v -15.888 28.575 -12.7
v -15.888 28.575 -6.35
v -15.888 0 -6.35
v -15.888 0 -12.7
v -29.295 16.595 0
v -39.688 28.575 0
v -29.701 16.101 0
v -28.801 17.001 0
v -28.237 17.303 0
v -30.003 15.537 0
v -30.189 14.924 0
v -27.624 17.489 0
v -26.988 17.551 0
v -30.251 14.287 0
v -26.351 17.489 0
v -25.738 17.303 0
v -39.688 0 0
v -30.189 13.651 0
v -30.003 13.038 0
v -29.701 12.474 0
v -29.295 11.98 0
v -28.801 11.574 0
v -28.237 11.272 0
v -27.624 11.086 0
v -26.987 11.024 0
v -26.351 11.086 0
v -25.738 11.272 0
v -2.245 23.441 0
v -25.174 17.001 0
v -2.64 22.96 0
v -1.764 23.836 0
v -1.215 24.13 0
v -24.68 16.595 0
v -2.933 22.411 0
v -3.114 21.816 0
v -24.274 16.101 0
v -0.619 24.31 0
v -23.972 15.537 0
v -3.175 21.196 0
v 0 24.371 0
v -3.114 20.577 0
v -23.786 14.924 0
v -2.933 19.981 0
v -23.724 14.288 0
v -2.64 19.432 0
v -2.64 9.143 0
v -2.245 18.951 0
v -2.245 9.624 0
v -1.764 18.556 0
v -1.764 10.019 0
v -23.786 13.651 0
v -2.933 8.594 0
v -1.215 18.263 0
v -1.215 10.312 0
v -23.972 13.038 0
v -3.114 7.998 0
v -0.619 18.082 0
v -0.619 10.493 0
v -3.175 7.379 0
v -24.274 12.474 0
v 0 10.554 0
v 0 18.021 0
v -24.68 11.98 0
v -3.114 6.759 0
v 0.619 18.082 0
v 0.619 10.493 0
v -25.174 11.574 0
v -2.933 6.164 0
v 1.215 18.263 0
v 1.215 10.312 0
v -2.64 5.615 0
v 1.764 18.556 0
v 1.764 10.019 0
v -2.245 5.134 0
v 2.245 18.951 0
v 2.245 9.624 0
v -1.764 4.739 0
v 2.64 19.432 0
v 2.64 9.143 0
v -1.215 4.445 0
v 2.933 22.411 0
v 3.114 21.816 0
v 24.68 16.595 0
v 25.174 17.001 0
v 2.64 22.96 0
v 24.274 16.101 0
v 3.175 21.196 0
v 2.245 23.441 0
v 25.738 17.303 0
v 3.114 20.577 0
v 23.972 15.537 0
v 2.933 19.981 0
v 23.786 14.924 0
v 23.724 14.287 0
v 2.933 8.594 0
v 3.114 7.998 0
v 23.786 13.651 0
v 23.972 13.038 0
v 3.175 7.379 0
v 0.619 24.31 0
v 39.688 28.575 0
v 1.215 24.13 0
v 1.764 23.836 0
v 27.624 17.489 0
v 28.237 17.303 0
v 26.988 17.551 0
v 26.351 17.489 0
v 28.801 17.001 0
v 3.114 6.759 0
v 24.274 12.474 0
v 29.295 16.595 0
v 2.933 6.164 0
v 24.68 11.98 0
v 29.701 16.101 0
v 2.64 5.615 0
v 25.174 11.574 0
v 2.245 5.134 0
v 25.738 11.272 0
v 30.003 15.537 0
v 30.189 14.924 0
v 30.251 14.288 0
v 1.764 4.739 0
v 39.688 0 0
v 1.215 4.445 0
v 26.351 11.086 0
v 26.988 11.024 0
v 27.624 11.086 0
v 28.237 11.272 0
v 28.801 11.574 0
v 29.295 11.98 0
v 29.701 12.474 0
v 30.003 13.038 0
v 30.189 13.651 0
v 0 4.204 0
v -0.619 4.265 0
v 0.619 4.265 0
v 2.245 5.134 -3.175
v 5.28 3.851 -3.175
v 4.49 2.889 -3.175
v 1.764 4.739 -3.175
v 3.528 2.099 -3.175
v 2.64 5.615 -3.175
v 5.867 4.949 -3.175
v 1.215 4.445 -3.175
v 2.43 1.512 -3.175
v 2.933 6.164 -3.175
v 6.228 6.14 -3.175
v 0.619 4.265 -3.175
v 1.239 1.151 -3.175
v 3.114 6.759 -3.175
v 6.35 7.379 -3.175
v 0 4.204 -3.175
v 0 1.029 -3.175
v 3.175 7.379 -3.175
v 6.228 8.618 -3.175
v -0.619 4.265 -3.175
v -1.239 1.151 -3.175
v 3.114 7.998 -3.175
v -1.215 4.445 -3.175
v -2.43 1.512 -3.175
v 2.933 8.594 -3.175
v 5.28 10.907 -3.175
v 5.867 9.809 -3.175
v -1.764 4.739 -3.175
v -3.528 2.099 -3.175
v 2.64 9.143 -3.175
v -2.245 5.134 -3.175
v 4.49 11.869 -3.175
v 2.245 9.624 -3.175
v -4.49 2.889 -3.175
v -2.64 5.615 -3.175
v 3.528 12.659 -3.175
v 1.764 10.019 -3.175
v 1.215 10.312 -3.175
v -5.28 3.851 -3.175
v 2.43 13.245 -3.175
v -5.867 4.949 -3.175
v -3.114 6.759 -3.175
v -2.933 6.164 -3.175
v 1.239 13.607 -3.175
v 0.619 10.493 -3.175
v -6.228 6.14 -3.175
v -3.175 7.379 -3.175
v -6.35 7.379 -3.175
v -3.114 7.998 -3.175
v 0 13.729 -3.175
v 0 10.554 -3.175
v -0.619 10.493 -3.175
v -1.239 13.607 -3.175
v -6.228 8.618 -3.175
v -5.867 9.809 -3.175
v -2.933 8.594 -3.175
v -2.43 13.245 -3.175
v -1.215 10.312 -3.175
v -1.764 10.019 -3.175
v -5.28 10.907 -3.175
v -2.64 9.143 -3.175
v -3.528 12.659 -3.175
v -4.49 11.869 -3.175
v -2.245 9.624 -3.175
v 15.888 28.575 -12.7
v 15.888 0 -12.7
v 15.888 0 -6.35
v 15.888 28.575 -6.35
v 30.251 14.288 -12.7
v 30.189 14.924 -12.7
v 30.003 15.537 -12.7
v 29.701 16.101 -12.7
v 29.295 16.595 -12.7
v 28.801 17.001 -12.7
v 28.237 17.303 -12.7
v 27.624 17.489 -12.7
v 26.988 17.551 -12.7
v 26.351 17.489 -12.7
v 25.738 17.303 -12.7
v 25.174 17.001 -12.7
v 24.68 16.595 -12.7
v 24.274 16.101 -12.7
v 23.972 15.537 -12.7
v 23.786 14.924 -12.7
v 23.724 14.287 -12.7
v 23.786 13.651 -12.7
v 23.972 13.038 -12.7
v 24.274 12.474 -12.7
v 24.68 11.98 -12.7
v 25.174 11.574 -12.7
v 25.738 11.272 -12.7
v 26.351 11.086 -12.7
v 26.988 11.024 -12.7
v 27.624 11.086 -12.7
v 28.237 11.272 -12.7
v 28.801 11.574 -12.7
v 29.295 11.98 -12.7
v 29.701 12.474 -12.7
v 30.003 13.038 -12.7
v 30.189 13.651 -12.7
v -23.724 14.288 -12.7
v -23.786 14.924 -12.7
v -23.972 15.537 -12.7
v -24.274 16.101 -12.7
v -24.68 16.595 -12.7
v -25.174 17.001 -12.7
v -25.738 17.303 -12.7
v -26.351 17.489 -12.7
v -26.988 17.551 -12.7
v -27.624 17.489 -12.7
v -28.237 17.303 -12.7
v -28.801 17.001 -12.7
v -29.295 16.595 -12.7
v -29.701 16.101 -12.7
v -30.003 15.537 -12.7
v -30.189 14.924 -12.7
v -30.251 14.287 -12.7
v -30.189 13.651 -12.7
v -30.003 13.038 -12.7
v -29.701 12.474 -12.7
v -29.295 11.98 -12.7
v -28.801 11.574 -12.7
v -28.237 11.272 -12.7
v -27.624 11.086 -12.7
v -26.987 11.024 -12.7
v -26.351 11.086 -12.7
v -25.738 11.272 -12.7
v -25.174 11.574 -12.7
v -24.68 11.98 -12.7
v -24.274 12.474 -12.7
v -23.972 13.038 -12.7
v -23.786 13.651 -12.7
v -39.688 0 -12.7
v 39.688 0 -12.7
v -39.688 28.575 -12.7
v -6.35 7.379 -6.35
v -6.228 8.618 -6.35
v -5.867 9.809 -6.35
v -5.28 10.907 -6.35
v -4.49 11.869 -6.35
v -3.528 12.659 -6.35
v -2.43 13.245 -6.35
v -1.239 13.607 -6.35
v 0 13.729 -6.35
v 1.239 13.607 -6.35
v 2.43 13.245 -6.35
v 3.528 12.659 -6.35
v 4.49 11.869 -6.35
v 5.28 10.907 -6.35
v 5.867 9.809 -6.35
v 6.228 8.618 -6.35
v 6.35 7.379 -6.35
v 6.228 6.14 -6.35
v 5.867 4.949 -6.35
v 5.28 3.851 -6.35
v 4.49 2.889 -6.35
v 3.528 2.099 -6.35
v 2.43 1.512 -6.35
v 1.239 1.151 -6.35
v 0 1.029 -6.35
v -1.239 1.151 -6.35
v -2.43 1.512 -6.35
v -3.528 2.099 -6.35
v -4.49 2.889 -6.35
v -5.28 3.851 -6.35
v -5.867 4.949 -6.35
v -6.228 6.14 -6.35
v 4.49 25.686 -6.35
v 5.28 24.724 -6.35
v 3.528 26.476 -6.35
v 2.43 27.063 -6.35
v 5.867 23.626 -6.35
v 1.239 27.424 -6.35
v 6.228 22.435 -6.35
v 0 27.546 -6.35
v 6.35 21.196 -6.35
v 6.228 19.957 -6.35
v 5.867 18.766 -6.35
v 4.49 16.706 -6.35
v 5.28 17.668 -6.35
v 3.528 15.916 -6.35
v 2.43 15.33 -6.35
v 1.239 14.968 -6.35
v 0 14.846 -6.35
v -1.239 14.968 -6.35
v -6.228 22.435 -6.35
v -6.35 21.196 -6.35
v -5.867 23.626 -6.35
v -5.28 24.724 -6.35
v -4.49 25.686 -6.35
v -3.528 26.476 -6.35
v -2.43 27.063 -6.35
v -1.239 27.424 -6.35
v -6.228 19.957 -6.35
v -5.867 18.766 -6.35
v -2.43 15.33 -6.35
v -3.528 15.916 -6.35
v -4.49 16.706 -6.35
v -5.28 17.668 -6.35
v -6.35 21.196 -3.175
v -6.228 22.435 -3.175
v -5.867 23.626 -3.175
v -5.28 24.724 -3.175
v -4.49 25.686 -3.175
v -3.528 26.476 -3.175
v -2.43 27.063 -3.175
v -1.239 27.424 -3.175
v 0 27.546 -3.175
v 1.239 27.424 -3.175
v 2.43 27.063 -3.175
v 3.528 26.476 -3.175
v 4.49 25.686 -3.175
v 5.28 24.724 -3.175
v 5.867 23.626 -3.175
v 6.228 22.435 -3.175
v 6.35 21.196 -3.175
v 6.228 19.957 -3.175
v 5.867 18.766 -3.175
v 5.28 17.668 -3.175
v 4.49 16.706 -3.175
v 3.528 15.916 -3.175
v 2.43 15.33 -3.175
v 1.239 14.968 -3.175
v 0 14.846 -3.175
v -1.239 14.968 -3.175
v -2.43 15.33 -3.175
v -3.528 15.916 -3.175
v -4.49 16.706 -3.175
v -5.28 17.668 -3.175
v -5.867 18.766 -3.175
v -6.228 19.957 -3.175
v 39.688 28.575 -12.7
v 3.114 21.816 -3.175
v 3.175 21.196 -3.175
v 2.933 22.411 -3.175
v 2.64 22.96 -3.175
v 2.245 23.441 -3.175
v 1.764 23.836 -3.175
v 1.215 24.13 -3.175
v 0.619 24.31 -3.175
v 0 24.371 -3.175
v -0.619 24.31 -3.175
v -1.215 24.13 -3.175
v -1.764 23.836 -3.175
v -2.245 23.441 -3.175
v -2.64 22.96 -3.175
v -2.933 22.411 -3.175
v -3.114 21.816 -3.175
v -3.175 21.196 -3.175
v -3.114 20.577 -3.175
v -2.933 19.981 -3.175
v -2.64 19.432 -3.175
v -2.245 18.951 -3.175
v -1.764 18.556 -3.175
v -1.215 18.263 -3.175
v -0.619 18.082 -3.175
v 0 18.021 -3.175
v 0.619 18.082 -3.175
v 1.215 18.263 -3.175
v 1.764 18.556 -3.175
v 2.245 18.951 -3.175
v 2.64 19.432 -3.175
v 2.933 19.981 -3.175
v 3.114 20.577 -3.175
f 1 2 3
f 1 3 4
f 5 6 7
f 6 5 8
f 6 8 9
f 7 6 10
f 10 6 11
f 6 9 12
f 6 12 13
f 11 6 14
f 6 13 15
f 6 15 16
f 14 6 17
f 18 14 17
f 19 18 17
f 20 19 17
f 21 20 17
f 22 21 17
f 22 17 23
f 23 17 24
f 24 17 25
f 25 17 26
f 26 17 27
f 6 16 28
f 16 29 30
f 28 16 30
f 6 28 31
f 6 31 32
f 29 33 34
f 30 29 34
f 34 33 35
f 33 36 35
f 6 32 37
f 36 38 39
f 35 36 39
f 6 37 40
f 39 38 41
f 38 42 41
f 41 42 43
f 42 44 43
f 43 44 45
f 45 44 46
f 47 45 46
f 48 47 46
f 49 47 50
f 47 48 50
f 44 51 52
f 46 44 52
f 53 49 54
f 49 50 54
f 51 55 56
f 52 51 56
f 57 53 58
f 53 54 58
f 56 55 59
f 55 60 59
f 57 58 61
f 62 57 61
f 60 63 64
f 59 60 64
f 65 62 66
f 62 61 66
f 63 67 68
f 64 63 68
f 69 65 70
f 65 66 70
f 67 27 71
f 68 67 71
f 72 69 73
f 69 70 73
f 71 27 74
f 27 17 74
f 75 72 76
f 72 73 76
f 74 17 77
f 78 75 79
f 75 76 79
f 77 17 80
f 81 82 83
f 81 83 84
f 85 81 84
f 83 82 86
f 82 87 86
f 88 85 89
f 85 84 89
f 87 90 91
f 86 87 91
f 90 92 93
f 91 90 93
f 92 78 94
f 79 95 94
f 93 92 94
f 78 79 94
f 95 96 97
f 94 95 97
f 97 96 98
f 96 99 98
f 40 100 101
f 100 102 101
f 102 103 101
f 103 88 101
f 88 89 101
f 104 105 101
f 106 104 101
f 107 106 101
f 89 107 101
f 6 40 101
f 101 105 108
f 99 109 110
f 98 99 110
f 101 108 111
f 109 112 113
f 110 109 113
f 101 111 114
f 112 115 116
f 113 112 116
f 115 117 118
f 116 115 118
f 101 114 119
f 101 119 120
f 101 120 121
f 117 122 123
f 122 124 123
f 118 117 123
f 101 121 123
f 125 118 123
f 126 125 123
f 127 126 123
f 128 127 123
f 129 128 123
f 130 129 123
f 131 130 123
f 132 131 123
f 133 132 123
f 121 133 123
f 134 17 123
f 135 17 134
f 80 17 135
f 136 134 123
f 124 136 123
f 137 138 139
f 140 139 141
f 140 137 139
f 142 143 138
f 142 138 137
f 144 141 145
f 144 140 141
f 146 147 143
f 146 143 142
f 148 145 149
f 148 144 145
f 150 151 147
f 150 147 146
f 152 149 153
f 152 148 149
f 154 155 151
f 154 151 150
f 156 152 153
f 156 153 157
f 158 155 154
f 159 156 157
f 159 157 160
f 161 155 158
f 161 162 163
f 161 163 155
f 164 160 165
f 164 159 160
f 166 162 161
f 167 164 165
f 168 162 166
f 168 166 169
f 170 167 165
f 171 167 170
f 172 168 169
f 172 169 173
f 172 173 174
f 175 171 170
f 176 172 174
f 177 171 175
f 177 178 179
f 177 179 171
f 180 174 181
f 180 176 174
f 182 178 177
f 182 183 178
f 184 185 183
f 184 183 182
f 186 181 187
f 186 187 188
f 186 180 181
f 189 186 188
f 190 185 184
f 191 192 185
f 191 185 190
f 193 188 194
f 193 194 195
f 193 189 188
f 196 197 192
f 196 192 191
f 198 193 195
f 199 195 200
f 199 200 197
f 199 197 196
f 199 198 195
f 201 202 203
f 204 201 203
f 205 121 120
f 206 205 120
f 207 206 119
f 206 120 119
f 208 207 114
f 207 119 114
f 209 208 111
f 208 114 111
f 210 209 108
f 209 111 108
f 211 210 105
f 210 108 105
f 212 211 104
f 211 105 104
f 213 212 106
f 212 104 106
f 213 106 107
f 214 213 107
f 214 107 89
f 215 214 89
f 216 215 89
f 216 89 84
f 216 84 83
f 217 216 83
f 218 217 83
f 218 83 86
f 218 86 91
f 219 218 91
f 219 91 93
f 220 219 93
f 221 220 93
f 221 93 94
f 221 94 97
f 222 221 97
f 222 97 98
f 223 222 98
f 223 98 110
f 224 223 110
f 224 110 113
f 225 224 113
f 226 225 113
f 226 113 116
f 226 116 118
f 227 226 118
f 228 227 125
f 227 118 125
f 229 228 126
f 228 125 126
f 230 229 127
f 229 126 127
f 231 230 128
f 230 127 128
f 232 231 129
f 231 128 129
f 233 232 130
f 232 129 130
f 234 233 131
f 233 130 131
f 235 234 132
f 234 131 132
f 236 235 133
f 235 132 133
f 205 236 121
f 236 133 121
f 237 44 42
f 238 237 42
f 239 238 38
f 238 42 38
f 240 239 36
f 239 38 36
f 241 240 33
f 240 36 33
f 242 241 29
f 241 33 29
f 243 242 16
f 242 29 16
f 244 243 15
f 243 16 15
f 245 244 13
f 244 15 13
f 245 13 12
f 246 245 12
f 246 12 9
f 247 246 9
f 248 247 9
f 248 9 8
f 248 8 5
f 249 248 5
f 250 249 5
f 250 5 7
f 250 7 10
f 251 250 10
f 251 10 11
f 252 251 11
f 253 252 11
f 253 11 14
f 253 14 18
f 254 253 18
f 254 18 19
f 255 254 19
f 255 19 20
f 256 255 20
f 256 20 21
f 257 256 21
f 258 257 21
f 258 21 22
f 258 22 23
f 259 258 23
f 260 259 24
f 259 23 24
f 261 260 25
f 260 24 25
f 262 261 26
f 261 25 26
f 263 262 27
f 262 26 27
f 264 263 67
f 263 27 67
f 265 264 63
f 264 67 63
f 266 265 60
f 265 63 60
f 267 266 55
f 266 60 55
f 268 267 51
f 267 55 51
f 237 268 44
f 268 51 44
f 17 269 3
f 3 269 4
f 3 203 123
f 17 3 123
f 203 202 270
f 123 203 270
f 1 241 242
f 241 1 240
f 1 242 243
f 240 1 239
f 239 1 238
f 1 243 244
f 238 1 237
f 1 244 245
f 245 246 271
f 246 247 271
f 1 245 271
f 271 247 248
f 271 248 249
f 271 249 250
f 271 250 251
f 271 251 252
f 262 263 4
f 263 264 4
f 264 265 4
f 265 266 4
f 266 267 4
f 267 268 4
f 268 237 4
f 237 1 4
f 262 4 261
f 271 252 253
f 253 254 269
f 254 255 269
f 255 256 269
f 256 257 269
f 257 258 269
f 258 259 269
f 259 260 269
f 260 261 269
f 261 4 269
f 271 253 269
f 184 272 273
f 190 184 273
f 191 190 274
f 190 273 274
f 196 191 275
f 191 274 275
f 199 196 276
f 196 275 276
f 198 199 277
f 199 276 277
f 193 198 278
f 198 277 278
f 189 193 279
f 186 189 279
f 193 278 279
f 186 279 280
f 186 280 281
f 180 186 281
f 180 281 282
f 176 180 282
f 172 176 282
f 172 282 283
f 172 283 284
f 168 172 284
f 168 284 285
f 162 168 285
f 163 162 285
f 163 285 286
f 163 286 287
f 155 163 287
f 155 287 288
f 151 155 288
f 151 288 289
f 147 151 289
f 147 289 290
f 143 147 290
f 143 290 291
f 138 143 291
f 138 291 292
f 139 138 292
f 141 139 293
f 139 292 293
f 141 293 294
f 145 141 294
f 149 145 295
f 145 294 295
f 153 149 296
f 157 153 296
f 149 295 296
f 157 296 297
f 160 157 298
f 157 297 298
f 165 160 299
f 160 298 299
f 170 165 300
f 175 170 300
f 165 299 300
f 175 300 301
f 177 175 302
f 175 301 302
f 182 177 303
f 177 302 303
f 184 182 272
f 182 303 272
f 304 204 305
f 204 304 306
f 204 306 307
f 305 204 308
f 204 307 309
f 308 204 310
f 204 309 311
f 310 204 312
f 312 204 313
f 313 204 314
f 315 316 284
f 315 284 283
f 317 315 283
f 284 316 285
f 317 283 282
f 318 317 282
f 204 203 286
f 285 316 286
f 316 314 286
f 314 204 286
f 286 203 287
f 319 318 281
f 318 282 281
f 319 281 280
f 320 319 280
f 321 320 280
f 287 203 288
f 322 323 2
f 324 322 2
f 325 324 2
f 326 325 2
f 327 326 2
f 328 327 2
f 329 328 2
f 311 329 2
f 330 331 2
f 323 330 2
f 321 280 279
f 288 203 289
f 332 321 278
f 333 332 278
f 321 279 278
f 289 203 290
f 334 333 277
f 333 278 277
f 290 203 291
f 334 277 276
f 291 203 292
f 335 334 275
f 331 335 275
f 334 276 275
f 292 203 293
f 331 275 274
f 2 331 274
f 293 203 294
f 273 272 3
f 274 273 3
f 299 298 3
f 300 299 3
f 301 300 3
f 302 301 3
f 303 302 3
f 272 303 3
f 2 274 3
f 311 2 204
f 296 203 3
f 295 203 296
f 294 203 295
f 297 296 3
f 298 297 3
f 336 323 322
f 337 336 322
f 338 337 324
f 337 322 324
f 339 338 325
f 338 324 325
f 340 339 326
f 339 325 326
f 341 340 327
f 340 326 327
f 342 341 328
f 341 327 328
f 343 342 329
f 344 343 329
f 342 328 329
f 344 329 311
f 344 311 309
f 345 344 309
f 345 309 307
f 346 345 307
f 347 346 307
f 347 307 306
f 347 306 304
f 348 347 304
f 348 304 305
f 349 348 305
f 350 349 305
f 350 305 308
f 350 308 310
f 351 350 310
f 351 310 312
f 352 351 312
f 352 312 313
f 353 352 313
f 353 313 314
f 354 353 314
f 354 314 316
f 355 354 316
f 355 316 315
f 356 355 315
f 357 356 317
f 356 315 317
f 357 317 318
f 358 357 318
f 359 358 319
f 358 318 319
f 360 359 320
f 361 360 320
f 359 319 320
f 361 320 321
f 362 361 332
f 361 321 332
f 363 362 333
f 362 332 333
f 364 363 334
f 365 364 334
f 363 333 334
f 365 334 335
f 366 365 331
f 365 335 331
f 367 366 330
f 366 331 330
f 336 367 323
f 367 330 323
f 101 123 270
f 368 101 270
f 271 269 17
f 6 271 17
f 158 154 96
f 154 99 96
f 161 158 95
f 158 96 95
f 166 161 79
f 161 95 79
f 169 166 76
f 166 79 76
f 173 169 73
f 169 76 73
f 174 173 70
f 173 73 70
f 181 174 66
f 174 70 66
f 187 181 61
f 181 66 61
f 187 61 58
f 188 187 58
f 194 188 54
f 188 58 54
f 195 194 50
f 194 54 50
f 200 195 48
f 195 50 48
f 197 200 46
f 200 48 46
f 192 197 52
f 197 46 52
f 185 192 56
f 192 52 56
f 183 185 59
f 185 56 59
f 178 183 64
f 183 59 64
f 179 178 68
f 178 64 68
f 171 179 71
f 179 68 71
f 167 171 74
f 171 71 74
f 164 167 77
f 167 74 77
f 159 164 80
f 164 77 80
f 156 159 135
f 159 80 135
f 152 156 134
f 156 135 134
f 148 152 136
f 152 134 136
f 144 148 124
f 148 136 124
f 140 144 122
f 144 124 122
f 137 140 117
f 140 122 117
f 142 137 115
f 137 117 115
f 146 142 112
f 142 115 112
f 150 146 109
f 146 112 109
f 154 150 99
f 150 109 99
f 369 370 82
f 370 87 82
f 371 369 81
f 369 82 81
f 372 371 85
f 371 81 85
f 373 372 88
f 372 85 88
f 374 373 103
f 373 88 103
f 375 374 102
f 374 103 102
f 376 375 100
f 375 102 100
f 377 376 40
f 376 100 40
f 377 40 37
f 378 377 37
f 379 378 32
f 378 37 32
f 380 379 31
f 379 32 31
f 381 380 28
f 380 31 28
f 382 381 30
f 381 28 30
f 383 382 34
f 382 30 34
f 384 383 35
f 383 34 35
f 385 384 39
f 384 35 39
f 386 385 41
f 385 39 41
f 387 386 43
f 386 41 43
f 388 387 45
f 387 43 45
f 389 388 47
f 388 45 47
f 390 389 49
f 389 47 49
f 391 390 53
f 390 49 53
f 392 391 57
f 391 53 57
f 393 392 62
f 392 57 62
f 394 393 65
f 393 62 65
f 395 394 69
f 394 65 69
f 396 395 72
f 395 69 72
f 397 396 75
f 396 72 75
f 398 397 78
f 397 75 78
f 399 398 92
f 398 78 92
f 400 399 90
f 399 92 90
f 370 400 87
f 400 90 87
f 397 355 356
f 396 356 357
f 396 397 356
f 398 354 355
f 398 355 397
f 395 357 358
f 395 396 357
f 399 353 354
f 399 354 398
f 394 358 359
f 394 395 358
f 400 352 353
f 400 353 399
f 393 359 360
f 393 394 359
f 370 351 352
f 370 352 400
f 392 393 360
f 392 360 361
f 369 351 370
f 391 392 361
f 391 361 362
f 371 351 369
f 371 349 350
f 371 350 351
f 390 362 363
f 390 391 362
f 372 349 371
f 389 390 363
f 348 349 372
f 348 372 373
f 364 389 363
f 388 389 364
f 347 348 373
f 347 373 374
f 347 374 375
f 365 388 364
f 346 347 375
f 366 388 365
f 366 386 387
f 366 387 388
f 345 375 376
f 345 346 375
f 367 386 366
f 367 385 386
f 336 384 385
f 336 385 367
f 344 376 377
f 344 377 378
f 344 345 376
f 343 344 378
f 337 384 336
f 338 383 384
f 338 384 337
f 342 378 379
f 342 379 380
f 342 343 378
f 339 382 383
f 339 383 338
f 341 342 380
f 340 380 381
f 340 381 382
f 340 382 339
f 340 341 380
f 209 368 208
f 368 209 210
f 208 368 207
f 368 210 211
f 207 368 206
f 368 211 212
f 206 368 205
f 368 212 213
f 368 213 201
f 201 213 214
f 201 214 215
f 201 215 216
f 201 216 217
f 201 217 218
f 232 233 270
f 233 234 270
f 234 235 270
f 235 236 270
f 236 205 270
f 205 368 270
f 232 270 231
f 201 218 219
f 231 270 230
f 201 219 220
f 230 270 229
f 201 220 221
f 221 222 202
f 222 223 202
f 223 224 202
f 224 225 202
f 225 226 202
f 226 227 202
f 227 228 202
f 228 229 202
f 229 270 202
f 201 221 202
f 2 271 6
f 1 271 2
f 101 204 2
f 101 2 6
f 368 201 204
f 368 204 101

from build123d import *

# Parameters (mm, degrees)
BOSS_EXTRUDE1_DEPTH      = 28.575
F_5_16_18_TAPPED_HOLE1_D = 6.5278
HOLE4_D                  = 6.35
HOLE4_DEPTH              = 6.35
HOLE4_CBORE_D            = 12.7
HOLE4_CBORE_DEPTH        = 3.175
HOLE4_TIP                = 1.907732465


with BuildPart() as part:
    # Sketch1 → Boss-Extrude1 (new body)
    with BuildSketch(Plane(origin=(0, 0, 0), x_dir=(1, 0, 0), z_dir=(0, 1, 0))):
        Polygon((-39.6875, 0), (39.6875, 0), (39.6875, 12.7), (15.8877, 12.7), (15.8877, 6.35), (-15.8877, 6.35), (-15.8877, 12.7), (-39.6875, 12.7), align=None)
    extrude(amount=BOSS_EXTRUDE1_DEPTH)

    # 5/16-18 Tapped Hole1 (through all)
    with Locations(Plane(origin=(0, 0, -12.7), x_dir=(-1, 0, 0), z_dir=(0, 0, -1))):
        with Locations((26.9875, 14.2875), (-26.9875, 14.2875)):
            Hole(F_5_16_18_TAPPED_HOLE1_D / 2)

    # Hole4
    with Locations(Plane(origin=(0, 0, -6.35), x_dir=(-1, 0, 0), z_dir=(0, 0, -1))):
        with Locations((0, 21.1963), (0, 7.3787)):
            CounterBoreHole(HOLE4_D / 2, HOLE4_CBORE_D / 2, HOLE4_CBORE_DEPTH, depth=HOLE4_DEPTH)
            with Locations((0, 0, -(HOLE4_DEPTH + HOLE4_TIP / 2))):  # 118° drill point
                Cone(0, HOLE4_D / 2, HOLE4_TIP, mode=Mode.SUBTRACT)


solid = part.part
